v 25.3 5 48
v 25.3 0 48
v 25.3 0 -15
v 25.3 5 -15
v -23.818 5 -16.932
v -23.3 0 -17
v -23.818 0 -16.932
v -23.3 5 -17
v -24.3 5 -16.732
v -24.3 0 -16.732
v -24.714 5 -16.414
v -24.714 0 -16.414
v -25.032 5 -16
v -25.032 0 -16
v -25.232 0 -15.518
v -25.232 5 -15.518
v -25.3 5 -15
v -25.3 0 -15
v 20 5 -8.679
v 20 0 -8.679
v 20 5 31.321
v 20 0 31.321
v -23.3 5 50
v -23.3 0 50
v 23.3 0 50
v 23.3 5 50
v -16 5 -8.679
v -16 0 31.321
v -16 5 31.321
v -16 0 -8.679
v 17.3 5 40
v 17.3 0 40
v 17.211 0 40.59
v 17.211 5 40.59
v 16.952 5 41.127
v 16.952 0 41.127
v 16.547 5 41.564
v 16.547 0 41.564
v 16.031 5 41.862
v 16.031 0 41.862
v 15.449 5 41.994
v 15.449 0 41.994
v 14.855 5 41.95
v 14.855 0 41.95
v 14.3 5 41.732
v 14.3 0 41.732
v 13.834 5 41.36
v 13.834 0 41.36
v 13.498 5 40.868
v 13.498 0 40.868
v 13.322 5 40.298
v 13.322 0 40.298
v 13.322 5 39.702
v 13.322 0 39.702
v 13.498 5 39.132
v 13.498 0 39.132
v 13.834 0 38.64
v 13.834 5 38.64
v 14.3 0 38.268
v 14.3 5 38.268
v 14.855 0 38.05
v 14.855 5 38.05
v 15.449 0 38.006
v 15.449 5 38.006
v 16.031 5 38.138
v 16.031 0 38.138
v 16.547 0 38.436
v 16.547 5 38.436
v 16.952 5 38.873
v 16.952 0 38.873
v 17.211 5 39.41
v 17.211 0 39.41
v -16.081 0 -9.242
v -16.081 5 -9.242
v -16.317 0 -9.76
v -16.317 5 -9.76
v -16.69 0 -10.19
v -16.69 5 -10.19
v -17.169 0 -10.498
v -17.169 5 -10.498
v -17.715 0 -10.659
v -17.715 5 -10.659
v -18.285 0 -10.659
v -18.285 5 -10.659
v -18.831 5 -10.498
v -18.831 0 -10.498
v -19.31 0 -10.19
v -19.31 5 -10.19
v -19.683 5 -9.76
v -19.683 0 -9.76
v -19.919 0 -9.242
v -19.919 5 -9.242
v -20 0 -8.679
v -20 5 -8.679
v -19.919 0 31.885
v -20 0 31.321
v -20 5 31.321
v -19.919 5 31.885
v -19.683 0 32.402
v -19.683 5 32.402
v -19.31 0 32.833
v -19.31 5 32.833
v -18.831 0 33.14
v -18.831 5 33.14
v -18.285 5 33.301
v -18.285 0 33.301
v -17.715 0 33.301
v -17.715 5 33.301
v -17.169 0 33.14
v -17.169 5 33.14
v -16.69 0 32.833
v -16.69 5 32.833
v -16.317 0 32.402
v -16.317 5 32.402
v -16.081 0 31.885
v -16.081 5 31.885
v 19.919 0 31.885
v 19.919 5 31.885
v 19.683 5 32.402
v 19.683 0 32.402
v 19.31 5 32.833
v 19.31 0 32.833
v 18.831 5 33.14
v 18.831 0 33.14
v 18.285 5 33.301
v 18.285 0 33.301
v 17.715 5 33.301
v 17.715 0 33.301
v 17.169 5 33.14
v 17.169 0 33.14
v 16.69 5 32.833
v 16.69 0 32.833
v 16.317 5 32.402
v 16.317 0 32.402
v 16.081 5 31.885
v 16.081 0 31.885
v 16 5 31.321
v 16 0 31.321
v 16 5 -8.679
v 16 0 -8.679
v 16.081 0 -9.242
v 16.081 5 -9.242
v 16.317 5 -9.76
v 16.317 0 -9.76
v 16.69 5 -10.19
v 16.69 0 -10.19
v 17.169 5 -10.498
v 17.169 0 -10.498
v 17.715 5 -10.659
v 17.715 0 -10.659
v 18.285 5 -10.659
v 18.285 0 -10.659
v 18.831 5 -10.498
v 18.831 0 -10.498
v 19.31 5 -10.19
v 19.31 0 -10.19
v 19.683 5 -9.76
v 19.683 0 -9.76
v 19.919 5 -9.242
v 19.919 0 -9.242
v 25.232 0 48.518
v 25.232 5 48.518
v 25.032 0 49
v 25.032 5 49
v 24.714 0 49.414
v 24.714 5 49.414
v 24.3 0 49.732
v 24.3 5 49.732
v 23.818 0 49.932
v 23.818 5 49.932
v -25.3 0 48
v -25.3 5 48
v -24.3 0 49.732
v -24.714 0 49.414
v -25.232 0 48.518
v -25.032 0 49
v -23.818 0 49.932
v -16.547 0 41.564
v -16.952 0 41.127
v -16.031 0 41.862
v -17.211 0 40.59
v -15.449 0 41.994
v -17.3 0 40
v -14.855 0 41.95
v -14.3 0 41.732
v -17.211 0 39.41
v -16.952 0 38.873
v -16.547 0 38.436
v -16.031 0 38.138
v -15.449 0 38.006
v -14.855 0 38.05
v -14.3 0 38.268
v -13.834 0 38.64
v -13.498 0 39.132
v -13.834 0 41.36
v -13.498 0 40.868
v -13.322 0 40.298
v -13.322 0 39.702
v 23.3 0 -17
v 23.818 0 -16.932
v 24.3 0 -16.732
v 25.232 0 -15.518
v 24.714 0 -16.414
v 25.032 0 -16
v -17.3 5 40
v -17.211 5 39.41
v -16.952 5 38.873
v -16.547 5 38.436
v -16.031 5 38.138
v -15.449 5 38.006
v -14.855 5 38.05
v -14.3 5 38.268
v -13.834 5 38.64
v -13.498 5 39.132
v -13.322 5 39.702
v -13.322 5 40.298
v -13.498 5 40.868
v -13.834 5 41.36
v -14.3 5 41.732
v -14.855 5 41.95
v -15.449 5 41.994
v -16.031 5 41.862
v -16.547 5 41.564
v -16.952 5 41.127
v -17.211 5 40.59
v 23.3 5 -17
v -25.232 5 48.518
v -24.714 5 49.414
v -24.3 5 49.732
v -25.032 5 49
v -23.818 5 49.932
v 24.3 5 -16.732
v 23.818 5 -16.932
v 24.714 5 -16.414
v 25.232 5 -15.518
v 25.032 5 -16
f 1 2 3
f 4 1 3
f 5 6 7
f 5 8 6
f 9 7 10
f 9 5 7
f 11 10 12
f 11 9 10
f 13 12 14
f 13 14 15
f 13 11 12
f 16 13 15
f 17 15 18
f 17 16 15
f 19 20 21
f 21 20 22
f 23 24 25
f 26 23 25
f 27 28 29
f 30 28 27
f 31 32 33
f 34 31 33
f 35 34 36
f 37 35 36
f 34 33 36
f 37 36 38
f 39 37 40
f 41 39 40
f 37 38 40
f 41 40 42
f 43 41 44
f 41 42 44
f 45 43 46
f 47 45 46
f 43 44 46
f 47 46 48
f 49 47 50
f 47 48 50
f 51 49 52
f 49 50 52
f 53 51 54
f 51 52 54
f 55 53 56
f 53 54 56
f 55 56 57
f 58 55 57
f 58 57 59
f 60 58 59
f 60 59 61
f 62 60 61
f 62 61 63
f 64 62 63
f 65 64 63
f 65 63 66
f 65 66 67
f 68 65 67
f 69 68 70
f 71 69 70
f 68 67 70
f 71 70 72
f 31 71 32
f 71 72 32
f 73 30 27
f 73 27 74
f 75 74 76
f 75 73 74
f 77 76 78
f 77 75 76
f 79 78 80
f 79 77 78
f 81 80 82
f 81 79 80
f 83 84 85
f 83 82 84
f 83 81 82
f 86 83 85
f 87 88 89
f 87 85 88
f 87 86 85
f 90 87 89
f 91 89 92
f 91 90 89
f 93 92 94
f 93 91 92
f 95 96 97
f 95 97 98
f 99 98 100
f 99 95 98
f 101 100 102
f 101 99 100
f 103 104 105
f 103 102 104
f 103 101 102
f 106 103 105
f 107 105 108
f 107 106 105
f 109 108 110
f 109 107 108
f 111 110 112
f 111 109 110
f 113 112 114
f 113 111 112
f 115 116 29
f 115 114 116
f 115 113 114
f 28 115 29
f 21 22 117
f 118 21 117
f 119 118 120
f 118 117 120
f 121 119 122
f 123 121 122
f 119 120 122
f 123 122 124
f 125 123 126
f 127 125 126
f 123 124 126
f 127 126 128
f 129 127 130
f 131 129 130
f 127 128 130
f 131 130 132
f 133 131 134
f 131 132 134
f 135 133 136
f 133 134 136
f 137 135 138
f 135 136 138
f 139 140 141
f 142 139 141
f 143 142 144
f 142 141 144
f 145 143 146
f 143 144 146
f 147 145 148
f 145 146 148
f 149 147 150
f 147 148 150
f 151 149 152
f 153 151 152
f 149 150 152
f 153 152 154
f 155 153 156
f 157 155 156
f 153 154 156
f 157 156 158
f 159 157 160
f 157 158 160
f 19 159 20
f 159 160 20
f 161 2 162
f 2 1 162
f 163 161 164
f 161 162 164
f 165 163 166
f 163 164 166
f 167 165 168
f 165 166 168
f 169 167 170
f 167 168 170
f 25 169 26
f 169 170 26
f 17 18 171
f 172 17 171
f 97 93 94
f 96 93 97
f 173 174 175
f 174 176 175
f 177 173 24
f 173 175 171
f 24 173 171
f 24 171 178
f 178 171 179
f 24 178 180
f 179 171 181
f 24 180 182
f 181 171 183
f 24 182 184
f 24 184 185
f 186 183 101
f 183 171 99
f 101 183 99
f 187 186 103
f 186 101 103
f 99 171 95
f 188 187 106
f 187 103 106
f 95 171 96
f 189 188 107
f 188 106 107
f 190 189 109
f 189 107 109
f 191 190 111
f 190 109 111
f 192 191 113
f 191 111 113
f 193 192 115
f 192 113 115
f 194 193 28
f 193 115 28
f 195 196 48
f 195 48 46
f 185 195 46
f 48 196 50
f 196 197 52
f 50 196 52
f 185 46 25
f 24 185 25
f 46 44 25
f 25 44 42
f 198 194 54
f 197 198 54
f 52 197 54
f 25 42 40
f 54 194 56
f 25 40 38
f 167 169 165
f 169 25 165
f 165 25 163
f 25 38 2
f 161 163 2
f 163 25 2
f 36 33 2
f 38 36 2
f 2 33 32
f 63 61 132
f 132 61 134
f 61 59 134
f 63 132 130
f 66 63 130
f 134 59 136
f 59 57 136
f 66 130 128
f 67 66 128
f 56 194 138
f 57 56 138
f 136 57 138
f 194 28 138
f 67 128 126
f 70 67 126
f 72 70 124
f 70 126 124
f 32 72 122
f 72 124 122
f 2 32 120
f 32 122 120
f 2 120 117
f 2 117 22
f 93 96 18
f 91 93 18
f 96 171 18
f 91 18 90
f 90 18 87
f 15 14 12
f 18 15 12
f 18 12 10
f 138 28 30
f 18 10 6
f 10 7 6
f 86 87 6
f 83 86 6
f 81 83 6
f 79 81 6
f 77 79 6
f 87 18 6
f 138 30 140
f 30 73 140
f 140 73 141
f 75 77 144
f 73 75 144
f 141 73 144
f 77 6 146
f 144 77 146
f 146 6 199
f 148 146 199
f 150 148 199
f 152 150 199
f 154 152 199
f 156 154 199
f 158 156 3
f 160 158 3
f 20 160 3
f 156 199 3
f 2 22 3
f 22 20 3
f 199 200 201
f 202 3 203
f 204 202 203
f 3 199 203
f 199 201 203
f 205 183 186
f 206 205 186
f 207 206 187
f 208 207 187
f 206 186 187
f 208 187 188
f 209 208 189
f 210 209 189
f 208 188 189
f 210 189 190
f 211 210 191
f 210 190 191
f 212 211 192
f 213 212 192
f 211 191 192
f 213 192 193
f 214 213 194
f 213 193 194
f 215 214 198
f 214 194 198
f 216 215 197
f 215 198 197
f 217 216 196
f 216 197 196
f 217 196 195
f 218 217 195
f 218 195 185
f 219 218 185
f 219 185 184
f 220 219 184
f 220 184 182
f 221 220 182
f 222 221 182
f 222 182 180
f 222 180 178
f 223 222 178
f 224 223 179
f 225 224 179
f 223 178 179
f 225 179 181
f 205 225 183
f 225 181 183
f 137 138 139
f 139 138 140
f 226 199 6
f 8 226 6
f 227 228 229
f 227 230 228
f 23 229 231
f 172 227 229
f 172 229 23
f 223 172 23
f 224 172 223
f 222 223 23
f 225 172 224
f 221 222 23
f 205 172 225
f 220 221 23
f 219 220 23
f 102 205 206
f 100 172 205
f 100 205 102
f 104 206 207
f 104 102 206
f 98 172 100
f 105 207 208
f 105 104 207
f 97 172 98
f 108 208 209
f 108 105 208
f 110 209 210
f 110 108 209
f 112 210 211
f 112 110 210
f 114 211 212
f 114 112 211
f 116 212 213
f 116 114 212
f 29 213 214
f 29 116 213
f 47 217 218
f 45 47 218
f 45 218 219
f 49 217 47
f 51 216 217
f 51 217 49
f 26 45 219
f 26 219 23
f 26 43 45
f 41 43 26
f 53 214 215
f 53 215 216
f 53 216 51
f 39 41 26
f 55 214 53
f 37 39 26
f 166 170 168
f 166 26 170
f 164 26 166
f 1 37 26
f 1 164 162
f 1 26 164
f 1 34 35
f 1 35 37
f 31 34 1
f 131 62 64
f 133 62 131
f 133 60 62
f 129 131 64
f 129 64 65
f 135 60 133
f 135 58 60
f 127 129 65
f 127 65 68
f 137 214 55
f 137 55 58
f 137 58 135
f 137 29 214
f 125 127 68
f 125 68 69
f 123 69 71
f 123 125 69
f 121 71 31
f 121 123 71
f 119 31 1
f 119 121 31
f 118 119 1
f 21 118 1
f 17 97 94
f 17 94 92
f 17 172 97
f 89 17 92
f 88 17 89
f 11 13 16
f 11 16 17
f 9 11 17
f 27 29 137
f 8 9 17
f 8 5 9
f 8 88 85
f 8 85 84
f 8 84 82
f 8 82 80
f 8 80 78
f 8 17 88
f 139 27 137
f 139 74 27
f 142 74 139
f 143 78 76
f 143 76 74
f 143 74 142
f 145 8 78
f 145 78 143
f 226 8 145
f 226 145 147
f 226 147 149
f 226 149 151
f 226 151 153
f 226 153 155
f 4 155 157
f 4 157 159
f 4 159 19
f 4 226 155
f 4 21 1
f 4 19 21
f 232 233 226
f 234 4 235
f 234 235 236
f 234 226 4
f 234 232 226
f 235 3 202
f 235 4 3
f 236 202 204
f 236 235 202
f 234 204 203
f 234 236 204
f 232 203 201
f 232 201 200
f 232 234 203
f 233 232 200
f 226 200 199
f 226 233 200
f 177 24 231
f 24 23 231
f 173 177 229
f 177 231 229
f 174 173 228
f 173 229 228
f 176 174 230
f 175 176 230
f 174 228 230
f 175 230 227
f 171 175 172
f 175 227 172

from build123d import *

# Parameters (mm, degrees)
EXTRUDE_1_DEPTH          = 5
FILLET_1_R               = 2
CUT_EXTRUDE_1_DEPTH      = 57.259132592
CUT_EXTRUDE_1_DEPTH_BACK = 57.259132592


with BuildPart() as part:
    # 草图1 → 凸台-拉伸1 (new body)
    with BuildSketch(Plane(origin=(0, 0, 0), x_dir=(1, 0, 0), z_dir=(0, 1, 0))):
        Polygon((25.3, -50), (25.3, 17), (-25.3, 17), (-25.3, -50), (-0.631149451, -50), (0.631149451, -50), align=None)
        with BuildLine():
            ThreePointArc((-13.3, -40), (-15.3, -42), (-17.3, -40))
            ThreePointArc((-17.3, -40), (-15.3, -38), (-13.3, -40))
        make_face(mode=Mode.SUBTRACT)
        with BuildLine():
            ThreePointArc((13.3, -40), (15.3, -38), (17.3, -40))
            ThreePointArc((17.3, -40), (15.3, -42), (13.3, -40))
        make_face(mode=Mode.SUBTRACT)
    extrude(amount=EXTRUDE_1_DEPTH)

    # 圆角1
    fillet_1_edges = [part.edges().sort_by_distance(p)[0] for p in [
        (25.3, 2.5, 50),
        (-25.3, 2.5, 50),
        (-25.3, 2.5, -17),
        (25.3, 2.5, -17),
    ]]
    fillet(fillet_1_edges, radius=FILLET_1_R)

    # 草图2 → 切除-拉伸1 (cut, two sides: drawn at the far end of the back side and taken through both)
    with BuildSketch(Plane(origin=(0, 5, 0), x_dir=(1, 0, 0), z_dir=(0, 1, 0)).offset(-CUT_EXTRUDE_1_DEPTH_BACK)):
        with BuildLine():
            Line((20, 8.678912506), (20, -31.321087494))
            ThreePointArc((20, -31.321087494), (18, -33.321087494), (16, -31.321087494))
            Line((16, -31.321087494), (16, 8.678912506))
            ThreePointArc((16, 8.678912506), (18, 10.678912506), (20, 8.678912506))
        make_face()
        with BuildLine():
            Line((-20, 8.678912506), (-20, -31.321087494))
            ThreePointArc((-20, -31.321087494), (-18, -33.321087494), (-16, -31.321087494))
            Line((-16, -31.321087494), (-16, 8.678912506))
            ThreePointArc((-16, 8.678912506), (-18, 10.678912506), (-20, 8.678912506))
        make_face()
    extrude(amount=CUT_EXTRUDE_1_DEPTH + CUT_EXTRUDE_1_DEPTH_BACK, mode=Mode.SUBTRACT)


solid = part.part
